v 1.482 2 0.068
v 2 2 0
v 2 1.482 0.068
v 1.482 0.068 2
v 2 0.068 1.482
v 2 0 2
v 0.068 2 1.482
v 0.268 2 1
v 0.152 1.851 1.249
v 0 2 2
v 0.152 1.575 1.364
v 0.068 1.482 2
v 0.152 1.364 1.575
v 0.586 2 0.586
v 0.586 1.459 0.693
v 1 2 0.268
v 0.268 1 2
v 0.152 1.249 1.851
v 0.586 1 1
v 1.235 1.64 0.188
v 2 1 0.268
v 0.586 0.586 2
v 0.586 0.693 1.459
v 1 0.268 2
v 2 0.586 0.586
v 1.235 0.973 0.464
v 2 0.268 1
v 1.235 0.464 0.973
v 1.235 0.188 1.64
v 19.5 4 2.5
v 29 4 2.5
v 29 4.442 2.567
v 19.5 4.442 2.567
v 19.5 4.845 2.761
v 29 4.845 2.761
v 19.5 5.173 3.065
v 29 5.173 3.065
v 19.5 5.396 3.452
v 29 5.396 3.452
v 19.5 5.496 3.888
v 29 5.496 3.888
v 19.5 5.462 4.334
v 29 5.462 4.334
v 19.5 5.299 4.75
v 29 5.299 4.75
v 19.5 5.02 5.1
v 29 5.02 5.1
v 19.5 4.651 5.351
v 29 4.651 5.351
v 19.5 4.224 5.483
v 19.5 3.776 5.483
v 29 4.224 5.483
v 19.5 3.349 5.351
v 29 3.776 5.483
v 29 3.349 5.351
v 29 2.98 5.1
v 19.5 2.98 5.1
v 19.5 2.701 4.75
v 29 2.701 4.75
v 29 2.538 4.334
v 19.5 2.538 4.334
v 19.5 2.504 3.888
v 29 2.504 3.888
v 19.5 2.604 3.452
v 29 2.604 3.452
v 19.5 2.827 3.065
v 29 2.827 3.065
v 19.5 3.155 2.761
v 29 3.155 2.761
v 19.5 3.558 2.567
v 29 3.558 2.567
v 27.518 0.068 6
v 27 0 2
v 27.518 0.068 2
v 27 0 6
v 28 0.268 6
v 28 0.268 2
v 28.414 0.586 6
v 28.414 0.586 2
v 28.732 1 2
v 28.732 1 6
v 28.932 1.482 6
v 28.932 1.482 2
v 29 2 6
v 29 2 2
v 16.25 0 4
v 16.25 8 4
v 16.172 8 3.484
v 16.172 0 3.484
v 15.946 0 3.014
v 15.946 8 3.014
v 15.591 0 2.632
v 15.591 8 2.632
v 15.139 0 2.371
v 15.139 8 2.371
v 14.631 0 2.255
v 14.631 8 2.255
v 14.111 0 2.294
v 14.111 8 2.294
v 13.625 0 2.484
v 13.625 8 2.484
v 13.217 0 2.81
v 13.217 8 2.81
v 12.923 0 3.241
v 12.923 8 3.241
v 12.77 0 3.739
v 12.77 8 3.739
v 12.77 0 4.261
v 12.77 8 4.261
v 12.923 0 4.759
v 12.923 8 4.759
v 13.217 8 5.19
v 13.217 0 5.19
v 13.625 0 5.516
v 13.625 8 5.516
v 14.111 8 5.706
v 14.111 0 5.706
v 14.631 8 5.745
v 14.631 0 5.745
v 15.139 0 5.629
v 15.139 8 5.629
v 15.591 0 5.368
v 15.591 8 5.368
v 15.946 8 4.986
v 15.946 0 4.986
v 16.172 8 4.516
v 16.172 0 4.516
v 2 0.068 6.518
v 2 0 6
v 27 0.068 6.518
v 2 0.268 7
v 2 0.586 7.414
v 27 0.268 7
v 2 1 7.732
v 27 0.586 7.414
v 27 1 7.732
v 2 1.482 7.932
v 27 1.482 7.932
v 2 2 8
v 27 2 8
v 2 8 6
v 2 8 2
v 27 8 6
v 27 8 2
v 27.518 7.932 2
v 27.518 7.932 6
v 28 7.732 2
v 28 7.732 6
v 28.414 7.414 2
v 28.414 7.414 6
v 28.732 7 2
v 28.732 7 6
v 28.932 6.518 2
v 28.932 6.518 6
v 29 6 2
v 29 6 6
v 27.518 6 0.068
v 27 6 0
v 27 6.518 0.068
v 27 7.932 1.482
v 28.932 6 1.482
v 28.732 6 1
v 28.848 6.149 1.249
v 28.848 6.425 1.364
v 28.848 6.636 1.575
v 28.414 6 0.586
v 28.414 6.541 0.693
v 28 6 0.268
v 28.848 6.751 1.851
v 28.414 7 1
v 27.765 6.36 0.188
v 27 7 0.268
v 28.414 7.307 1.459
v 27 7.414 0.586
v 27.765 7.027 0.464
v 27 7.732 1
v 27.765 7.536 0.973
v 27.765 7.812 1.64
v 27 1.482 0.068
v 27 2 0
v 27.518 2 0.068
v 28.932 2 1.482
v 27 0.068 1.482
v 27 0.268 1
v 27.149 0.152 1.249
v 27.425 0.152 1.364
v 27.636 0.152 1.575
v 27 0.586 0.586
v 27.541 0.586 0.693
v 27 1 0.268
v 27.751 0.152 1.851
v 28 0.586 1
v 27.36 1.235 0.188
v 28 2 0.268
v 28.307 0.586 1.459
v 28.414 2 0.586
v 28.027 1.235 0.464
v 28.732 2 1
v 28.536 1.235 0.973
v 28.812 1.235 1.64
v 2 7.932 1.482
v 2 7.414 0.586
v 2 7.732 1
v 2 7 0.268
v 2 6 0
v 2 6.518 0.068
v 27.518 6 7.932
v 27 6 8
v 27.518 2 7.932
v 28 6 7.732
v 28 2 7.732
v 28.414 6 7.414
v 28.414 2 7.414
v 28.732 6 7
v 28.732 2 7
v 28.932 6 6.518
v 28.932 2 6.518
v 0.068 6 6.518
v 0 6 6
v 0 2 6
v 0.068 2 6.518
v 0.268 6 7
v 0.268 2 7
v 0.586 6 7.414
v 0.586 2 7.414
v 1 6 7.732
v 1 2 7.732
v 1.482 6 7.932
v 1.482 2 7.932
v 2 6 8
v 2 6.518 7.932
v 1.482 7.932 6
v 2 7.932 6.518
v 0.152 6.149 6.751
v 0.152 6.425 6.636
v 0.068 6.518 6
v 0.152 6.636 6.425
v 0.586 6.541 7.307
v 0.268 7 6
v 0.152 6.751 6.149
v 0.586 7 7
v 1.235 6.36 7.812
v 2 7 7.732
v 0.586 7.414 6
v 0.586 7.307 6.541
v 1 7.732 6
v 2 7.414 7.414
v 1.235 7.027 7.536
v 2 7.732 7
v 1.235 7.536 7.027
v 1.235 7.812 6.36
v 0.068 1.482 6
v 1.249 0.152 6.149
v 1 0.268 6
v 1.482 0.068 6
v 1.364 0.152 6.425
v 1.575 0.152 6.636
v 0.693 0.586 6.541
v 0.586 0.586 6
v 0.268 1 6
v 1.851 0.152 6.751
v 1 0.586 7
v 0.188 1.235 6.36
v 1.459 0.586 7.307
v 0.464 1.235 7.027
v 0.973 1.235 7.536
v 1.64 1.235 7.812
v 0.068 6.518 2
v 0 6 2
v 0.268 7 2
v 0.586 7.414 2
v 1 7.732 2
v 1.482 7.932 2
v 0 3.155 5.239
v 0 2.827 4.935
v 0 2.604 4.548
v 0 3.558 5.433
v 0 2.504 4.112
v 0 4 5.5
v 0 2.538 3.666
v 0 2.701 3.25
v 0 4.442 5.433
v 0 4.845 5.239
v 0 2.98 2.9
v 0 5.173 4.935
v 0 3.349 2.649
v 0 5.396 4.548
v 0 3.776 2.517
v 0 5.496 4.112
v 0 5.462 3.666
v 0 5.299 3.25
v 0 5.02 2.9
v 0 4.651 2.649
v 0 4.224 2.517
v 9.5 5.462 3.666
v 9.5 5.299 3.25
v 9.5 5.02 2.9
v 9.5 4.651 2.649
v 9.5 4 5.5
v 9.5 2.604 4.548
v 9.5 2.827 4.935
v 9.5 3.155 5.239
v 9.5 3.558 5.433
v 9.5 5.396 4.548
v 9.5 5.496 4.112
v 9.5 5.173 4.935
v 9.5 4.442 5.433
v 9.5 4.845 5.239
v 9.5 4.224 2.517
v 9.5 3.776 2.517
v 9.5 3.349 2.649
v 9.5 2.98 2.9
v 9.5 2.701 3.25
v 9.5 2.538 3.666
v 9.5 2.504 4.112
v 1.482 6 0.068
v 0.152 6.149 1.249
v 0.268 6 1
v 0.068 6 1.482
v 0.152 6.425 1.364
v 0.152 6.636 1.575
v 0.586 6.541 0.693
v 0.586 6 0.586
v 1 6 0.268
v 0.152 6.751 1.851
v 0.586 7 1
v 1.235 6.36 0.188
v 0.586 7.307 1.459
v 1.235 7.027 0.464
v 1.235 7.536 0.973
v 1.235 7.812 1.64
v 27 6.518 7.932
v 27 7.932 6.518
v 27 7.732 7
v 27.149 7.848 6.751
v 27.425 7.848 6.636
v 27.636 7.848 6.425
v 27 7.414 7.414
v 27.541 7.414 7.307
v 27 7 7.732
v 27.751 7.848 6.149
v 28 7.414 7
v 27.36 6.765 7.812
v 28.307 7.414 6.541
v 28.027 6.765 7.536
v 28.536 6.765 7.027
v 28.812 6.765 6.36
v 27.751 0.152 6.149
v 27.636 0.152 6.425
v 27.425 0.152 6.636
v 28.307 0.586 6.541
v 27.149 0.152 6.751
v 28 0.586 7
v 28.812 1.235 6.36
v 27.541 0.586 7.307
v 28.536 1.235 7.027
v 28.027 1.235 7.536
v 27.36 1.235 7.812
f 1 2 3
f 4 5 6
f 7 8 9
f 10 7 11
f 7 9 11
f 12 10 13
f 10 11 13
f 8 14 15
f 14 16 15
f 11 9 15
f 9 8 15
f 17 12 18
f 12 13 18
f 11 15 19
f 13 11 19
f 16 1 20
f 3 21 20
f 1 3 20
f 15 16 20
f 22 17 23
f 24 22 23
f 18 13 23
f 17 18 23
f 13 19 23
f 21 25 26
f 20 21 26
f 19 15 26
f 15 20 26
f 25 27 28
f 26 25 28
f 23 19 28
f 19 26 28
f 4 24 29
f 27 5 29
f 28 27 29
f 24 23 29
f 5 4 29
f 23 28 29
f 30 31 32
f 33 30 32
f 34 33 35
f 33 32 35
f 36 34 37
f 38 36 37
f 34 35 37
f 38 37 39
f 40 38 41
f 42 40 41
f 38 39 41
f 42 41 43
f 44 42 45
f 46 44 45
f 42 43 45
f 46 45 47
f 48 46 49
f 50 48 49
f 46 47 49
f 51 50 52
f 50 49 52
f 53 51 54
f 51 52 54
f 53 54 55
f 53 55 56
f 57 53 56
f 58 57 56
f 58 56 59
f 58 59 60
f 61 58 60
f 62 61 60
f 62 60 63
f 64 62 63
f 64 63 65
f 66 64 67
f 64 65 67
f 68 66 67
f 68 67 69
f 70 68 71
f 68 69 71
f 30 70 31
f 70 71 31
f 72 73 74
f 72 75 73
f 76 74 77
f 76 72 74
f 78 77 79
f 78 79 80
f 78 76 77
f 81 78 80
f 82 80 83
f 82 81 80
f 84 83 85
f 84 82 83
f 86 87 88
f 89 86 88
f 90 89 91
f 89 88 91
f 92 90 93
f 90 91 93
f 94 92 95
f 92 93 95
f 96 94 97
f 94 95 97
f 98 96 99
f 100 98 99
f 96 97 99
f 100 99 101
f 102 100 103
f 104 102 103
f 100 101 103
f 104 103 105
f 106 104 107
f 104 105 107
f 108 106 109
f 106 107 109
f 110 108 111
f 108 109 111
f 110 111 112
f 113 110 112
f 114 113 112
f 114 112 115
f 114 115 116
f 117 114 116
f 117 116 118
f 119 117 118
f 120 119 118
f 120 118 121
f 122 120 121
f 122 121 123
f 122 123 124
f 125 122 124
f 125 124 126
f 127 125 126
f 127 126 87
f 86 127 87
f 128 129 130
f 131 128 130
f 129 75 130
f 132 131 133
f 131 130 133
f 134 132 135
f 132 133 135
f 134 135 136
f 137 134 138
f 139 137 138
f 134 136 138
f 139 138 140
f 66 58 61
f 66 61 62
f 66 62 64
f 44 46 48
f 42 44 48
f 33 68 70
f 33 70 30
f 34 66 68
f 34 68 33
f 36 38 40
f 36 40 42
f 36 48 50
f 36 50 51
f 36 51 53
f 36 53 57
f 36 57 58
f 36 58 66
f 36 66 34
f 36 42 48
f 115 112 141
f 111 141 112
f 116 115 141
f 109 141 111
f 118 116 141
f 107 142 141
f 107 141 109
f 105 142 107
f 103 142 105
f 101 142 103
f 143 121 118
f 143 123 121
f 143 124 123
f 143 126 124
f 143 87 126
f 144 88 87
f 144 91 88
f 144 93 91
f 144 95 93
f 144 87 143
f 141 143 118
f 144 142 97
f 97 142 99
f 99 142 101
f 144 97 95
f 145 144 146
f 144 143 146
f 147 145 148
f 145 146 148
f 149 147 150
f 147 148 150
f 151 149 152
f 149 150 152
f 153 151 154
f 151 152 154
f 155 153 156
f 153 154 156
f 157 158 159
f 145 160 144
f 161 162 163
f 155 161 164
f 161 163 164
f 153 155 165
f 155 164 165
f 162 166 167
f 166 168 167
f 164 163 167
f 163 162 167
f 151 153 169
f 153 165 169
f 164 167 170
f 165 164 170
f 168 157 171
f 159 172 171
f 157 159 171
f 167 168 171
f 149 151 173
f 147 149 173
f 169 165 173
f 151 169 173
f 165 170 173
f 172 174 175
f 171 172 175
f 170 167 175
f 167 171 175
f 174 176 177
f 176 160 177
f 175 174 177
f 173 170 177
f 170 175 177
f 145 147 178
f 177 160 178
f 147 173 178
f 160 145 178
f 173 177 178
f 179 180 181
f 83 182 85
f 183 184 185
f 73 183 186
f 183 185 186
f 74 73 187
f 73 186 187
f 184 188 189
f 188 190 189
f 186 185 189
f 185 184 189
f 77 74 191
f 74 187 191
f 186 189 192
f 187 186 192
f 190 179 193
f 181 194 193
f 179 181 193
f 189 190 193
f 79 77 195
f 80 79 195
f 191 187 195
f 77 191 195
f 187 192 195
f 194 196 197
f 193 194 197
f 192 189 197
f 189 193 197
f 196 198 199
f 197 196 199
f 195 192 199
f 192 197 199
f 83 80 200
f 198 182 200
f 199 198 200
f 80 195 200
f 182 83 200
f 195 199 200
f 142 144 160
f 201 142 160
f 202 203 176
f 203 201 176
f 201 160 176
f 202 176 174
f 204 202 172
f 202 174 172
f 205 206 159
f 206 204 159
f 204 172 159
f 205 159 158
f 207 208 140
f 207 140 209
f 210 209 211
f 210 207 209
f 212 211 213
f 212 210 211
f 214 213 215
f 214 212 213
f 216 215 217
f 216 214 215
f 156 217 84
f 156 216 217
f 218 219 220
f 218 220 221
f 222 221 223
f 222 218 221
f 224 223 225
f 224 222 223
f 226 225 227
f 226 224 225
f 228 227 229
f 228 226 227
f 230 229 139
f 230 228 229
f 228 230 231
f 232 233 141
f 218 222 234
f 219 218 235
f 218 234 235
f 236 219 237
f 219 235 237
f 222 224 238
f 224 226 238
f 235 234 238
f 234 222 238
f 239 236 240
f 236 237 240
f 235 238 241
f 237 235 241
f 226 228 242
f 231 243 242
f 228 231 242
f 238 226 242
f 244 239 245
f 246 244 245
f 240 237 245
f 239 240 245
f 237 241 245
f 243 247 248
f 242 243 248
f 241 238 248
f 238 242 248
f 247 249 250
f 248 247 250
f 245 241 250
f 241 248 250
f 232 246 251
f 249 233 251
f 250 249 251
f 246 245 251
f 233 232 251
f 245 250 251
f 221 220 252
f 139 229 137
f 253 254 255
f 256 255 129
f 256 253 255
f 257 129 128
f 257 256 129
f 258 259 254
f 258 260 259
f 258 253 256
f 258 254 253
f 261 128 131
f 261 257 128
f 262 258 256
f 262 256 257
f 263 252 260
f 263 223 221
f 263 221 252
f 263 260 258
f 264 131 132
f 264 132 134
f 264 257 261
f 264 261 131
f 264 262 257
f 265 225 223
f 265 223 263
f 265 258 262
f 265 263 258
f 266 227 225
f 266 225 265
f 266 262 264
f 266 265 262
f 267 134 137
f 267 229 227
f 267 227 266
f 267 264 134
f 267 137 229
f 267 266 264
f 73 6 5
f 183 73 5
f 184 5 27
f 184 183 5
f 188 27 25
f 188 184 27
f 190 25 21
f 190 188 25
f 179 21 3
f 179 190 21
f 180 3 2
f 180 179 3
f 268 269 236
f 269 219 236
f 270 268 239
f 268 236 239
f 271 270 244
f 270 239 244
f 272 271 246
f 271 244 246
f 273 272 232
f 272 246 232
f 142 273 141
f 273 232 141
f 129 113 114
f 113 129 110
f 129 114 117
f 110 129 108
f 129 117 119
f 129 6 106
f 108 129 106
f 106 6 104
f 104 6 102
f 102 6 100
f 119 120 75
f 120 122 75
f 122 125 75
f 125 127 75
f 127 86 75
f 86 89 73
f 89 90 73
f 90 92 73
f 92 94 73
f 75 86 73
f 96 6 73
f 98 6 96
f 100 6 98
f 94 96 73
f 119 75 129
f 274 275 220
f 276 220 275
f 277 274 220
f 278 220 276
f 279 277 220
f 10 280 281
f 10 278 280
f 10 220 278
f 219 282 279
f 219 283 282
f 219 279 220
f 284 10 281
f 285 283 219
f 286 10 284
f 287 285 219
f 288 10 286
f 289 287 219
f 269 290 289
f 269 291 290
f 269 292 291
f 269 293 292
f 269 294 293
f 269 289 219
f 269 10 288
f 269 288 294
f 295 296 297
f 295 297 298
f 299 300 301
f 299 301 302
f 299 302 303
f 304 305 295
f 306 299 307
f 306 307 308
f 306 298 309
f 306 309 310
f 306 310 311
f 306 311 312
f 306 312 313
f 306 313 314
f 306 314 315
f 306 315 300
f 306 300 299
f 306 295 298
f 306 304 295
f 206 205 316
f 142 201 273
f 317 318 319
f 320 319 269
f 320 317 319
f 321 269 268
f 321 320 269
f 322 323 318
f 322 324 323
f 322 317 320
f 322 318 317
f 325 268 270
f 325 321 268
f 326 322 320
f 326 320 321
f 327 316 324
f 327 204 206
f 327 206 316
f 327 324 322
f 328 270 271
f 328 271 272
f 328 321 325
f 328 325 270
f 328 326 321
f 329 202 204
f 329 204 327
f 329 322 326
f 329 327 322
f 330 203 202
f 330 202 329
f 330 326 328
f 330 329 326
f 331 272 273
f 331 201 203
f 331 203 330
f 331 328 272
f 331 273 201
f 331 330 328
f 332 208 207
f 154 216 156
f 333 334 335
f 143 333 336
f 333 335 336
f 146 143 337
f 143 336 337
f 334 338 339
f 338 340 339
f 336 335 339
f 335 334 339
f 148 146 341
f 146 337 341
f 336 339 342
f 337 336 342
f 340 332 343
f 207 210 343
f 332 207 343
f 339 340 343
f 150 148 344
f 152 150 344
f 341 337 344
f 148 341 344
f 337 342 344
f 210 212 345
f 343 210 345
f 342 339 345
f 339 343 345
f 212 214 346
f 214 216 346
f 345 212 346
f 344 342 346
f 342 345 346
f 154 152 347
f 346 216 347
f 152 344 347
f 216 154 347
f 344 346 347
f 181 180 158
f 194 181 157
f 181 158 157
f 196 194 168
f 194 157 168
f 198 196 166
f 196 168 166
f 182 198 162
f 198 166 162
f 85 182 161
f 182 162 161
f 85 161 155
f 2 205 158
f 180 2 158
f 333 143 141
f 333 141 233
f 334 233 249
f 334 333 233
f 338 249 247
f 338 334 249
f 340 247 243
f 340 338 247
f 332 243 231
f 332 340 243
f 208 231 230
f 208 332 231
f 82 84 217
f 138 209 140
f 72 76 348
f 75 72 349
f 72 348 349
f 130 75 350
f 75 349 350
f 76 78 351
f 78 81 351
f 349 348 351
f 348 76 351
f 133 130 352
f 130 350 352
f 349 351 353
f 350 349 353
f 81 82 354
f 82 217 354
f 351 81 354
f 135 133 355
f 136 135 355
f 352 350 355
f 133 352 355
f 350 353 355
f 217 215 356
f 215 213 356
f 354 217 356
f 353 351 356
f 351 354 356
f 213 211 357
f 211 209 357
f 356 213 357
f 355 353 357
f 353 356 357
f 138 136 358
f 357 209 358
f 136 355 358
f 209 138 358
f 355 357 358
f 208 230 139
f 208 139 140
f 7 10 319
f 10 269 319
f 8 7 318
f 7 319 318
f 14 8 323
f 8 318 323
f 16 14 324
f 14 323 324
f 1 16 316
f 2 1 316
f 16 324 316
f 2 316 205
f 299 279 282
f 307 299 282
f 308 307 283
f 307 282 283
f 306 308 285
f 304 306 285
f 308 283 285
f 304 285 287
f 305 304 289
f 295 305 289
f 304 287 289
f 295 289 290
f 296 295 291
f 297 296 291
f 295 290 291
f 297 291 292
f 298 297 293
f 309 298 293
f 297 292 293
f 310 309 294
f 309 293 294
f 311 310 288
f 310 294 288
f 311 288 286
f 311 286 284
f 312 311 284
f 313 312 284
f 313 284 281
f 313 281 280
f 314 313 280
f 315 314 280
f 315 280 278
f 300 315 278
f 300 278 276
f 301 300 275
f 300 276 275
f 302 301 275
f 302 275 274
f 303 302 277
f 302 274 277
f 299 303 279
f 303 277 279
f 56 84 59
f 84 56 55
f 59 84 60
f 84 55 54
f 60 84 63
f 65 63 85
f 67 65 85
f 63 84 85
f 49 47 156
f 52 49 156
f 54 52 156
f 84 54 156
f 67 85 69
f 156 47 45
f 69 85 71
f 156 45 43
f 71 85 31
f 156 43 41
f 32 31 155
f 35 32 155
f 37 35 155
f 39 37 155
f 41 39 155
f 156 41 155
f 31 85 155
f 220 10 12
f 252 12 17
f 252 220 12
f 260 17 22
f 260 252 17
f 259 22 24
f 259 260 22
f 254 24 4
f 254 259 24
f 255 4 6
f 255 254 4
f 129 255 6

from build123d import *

# Parameters (mm, degrees)
CROQUIS1_W              = 29
CROQUIS1_H              = 8
SALIENTE_EXTRUIR1_DEPTH = 8
CROQUIS4_R              = 1.75
CORTAR_EXTRUIR1_DEPTH   = 9
REDONDEO1_R             = 2
CROQUIS5_R              = 1.5
CORTAR_EXTRUIR2_DEPTH   = 9.5
CROQUIS6_R              = 1.5
CORTAR_EXTRUIR3_DEPTH   = 9.5


with BuildPart() as part:
    # Croquis1 → Saliente-Extruir1 (new body)
    with BuildSketch(Plane.XY):
        with Locations((14.5, 4)):
            Rectangle(CROQUIS1_W, CROQUIS1_H)
    extrude(amount=SALIENTE_EXTRUIR1_DEPTH)

    # Croquis4 → Cortar-Extruir1 (cut, through all)
    with BuildSketch(Plane(origin=(0, 8, 0), x_dir=(1, 0, 0), z_dir=(0, 1, 0))):
        with Locations((14.5, -4)):
            Circle(CROQUIS4_R)
    extrude(amount=-CORTAR_EXTRUIR1_DEPTH, mode=Mode.SUBTRACT)

    # Redondeo1
    redondeo1_edges = [part.edges().sort_by_distance(p)[0] for p in [
        (29, 4, 8),
        (14.5, 8, 8),
        (0, 4, 8),
        (14.5, 8, 0),
        (29, 4, 0),
        (14.5, 0, 0),
        (0, 4, 0),
        (0, 8, 4),
        (29, 8, 4),
        (29, 0, 4),
        (0, 0, 4),
        (14.5, 0, 8),
    ]]
    fillet(redondeo1_edges, radius=REDONDEO1_R)

    # Croquis5 → Cortar-Extruir2 (cut)
    with BuildSketch(Plane(origin=(29, 0, 0), x_dir=(0, 0, -1), z_dir=(1, 0, 0))):
        with Locations((-4, 4)):
            Circle(CROQUIS5_R)
    extrude(amount=-CORTAR_EXTRUIR2_DEPTH, mode=Mode.SUBTRACT)

    # Croquis6 → Cortar-Extruir3 (cut)
    with BuildSketch(Plane.ZY):
        with Locations((4, 4)):
            Circle(CROQUIS6_R)
    extrude(amount=-CORTAR_EXTRUIR3_DEPTH, mode=Mode.SUBTRACT)


solid = part.part
